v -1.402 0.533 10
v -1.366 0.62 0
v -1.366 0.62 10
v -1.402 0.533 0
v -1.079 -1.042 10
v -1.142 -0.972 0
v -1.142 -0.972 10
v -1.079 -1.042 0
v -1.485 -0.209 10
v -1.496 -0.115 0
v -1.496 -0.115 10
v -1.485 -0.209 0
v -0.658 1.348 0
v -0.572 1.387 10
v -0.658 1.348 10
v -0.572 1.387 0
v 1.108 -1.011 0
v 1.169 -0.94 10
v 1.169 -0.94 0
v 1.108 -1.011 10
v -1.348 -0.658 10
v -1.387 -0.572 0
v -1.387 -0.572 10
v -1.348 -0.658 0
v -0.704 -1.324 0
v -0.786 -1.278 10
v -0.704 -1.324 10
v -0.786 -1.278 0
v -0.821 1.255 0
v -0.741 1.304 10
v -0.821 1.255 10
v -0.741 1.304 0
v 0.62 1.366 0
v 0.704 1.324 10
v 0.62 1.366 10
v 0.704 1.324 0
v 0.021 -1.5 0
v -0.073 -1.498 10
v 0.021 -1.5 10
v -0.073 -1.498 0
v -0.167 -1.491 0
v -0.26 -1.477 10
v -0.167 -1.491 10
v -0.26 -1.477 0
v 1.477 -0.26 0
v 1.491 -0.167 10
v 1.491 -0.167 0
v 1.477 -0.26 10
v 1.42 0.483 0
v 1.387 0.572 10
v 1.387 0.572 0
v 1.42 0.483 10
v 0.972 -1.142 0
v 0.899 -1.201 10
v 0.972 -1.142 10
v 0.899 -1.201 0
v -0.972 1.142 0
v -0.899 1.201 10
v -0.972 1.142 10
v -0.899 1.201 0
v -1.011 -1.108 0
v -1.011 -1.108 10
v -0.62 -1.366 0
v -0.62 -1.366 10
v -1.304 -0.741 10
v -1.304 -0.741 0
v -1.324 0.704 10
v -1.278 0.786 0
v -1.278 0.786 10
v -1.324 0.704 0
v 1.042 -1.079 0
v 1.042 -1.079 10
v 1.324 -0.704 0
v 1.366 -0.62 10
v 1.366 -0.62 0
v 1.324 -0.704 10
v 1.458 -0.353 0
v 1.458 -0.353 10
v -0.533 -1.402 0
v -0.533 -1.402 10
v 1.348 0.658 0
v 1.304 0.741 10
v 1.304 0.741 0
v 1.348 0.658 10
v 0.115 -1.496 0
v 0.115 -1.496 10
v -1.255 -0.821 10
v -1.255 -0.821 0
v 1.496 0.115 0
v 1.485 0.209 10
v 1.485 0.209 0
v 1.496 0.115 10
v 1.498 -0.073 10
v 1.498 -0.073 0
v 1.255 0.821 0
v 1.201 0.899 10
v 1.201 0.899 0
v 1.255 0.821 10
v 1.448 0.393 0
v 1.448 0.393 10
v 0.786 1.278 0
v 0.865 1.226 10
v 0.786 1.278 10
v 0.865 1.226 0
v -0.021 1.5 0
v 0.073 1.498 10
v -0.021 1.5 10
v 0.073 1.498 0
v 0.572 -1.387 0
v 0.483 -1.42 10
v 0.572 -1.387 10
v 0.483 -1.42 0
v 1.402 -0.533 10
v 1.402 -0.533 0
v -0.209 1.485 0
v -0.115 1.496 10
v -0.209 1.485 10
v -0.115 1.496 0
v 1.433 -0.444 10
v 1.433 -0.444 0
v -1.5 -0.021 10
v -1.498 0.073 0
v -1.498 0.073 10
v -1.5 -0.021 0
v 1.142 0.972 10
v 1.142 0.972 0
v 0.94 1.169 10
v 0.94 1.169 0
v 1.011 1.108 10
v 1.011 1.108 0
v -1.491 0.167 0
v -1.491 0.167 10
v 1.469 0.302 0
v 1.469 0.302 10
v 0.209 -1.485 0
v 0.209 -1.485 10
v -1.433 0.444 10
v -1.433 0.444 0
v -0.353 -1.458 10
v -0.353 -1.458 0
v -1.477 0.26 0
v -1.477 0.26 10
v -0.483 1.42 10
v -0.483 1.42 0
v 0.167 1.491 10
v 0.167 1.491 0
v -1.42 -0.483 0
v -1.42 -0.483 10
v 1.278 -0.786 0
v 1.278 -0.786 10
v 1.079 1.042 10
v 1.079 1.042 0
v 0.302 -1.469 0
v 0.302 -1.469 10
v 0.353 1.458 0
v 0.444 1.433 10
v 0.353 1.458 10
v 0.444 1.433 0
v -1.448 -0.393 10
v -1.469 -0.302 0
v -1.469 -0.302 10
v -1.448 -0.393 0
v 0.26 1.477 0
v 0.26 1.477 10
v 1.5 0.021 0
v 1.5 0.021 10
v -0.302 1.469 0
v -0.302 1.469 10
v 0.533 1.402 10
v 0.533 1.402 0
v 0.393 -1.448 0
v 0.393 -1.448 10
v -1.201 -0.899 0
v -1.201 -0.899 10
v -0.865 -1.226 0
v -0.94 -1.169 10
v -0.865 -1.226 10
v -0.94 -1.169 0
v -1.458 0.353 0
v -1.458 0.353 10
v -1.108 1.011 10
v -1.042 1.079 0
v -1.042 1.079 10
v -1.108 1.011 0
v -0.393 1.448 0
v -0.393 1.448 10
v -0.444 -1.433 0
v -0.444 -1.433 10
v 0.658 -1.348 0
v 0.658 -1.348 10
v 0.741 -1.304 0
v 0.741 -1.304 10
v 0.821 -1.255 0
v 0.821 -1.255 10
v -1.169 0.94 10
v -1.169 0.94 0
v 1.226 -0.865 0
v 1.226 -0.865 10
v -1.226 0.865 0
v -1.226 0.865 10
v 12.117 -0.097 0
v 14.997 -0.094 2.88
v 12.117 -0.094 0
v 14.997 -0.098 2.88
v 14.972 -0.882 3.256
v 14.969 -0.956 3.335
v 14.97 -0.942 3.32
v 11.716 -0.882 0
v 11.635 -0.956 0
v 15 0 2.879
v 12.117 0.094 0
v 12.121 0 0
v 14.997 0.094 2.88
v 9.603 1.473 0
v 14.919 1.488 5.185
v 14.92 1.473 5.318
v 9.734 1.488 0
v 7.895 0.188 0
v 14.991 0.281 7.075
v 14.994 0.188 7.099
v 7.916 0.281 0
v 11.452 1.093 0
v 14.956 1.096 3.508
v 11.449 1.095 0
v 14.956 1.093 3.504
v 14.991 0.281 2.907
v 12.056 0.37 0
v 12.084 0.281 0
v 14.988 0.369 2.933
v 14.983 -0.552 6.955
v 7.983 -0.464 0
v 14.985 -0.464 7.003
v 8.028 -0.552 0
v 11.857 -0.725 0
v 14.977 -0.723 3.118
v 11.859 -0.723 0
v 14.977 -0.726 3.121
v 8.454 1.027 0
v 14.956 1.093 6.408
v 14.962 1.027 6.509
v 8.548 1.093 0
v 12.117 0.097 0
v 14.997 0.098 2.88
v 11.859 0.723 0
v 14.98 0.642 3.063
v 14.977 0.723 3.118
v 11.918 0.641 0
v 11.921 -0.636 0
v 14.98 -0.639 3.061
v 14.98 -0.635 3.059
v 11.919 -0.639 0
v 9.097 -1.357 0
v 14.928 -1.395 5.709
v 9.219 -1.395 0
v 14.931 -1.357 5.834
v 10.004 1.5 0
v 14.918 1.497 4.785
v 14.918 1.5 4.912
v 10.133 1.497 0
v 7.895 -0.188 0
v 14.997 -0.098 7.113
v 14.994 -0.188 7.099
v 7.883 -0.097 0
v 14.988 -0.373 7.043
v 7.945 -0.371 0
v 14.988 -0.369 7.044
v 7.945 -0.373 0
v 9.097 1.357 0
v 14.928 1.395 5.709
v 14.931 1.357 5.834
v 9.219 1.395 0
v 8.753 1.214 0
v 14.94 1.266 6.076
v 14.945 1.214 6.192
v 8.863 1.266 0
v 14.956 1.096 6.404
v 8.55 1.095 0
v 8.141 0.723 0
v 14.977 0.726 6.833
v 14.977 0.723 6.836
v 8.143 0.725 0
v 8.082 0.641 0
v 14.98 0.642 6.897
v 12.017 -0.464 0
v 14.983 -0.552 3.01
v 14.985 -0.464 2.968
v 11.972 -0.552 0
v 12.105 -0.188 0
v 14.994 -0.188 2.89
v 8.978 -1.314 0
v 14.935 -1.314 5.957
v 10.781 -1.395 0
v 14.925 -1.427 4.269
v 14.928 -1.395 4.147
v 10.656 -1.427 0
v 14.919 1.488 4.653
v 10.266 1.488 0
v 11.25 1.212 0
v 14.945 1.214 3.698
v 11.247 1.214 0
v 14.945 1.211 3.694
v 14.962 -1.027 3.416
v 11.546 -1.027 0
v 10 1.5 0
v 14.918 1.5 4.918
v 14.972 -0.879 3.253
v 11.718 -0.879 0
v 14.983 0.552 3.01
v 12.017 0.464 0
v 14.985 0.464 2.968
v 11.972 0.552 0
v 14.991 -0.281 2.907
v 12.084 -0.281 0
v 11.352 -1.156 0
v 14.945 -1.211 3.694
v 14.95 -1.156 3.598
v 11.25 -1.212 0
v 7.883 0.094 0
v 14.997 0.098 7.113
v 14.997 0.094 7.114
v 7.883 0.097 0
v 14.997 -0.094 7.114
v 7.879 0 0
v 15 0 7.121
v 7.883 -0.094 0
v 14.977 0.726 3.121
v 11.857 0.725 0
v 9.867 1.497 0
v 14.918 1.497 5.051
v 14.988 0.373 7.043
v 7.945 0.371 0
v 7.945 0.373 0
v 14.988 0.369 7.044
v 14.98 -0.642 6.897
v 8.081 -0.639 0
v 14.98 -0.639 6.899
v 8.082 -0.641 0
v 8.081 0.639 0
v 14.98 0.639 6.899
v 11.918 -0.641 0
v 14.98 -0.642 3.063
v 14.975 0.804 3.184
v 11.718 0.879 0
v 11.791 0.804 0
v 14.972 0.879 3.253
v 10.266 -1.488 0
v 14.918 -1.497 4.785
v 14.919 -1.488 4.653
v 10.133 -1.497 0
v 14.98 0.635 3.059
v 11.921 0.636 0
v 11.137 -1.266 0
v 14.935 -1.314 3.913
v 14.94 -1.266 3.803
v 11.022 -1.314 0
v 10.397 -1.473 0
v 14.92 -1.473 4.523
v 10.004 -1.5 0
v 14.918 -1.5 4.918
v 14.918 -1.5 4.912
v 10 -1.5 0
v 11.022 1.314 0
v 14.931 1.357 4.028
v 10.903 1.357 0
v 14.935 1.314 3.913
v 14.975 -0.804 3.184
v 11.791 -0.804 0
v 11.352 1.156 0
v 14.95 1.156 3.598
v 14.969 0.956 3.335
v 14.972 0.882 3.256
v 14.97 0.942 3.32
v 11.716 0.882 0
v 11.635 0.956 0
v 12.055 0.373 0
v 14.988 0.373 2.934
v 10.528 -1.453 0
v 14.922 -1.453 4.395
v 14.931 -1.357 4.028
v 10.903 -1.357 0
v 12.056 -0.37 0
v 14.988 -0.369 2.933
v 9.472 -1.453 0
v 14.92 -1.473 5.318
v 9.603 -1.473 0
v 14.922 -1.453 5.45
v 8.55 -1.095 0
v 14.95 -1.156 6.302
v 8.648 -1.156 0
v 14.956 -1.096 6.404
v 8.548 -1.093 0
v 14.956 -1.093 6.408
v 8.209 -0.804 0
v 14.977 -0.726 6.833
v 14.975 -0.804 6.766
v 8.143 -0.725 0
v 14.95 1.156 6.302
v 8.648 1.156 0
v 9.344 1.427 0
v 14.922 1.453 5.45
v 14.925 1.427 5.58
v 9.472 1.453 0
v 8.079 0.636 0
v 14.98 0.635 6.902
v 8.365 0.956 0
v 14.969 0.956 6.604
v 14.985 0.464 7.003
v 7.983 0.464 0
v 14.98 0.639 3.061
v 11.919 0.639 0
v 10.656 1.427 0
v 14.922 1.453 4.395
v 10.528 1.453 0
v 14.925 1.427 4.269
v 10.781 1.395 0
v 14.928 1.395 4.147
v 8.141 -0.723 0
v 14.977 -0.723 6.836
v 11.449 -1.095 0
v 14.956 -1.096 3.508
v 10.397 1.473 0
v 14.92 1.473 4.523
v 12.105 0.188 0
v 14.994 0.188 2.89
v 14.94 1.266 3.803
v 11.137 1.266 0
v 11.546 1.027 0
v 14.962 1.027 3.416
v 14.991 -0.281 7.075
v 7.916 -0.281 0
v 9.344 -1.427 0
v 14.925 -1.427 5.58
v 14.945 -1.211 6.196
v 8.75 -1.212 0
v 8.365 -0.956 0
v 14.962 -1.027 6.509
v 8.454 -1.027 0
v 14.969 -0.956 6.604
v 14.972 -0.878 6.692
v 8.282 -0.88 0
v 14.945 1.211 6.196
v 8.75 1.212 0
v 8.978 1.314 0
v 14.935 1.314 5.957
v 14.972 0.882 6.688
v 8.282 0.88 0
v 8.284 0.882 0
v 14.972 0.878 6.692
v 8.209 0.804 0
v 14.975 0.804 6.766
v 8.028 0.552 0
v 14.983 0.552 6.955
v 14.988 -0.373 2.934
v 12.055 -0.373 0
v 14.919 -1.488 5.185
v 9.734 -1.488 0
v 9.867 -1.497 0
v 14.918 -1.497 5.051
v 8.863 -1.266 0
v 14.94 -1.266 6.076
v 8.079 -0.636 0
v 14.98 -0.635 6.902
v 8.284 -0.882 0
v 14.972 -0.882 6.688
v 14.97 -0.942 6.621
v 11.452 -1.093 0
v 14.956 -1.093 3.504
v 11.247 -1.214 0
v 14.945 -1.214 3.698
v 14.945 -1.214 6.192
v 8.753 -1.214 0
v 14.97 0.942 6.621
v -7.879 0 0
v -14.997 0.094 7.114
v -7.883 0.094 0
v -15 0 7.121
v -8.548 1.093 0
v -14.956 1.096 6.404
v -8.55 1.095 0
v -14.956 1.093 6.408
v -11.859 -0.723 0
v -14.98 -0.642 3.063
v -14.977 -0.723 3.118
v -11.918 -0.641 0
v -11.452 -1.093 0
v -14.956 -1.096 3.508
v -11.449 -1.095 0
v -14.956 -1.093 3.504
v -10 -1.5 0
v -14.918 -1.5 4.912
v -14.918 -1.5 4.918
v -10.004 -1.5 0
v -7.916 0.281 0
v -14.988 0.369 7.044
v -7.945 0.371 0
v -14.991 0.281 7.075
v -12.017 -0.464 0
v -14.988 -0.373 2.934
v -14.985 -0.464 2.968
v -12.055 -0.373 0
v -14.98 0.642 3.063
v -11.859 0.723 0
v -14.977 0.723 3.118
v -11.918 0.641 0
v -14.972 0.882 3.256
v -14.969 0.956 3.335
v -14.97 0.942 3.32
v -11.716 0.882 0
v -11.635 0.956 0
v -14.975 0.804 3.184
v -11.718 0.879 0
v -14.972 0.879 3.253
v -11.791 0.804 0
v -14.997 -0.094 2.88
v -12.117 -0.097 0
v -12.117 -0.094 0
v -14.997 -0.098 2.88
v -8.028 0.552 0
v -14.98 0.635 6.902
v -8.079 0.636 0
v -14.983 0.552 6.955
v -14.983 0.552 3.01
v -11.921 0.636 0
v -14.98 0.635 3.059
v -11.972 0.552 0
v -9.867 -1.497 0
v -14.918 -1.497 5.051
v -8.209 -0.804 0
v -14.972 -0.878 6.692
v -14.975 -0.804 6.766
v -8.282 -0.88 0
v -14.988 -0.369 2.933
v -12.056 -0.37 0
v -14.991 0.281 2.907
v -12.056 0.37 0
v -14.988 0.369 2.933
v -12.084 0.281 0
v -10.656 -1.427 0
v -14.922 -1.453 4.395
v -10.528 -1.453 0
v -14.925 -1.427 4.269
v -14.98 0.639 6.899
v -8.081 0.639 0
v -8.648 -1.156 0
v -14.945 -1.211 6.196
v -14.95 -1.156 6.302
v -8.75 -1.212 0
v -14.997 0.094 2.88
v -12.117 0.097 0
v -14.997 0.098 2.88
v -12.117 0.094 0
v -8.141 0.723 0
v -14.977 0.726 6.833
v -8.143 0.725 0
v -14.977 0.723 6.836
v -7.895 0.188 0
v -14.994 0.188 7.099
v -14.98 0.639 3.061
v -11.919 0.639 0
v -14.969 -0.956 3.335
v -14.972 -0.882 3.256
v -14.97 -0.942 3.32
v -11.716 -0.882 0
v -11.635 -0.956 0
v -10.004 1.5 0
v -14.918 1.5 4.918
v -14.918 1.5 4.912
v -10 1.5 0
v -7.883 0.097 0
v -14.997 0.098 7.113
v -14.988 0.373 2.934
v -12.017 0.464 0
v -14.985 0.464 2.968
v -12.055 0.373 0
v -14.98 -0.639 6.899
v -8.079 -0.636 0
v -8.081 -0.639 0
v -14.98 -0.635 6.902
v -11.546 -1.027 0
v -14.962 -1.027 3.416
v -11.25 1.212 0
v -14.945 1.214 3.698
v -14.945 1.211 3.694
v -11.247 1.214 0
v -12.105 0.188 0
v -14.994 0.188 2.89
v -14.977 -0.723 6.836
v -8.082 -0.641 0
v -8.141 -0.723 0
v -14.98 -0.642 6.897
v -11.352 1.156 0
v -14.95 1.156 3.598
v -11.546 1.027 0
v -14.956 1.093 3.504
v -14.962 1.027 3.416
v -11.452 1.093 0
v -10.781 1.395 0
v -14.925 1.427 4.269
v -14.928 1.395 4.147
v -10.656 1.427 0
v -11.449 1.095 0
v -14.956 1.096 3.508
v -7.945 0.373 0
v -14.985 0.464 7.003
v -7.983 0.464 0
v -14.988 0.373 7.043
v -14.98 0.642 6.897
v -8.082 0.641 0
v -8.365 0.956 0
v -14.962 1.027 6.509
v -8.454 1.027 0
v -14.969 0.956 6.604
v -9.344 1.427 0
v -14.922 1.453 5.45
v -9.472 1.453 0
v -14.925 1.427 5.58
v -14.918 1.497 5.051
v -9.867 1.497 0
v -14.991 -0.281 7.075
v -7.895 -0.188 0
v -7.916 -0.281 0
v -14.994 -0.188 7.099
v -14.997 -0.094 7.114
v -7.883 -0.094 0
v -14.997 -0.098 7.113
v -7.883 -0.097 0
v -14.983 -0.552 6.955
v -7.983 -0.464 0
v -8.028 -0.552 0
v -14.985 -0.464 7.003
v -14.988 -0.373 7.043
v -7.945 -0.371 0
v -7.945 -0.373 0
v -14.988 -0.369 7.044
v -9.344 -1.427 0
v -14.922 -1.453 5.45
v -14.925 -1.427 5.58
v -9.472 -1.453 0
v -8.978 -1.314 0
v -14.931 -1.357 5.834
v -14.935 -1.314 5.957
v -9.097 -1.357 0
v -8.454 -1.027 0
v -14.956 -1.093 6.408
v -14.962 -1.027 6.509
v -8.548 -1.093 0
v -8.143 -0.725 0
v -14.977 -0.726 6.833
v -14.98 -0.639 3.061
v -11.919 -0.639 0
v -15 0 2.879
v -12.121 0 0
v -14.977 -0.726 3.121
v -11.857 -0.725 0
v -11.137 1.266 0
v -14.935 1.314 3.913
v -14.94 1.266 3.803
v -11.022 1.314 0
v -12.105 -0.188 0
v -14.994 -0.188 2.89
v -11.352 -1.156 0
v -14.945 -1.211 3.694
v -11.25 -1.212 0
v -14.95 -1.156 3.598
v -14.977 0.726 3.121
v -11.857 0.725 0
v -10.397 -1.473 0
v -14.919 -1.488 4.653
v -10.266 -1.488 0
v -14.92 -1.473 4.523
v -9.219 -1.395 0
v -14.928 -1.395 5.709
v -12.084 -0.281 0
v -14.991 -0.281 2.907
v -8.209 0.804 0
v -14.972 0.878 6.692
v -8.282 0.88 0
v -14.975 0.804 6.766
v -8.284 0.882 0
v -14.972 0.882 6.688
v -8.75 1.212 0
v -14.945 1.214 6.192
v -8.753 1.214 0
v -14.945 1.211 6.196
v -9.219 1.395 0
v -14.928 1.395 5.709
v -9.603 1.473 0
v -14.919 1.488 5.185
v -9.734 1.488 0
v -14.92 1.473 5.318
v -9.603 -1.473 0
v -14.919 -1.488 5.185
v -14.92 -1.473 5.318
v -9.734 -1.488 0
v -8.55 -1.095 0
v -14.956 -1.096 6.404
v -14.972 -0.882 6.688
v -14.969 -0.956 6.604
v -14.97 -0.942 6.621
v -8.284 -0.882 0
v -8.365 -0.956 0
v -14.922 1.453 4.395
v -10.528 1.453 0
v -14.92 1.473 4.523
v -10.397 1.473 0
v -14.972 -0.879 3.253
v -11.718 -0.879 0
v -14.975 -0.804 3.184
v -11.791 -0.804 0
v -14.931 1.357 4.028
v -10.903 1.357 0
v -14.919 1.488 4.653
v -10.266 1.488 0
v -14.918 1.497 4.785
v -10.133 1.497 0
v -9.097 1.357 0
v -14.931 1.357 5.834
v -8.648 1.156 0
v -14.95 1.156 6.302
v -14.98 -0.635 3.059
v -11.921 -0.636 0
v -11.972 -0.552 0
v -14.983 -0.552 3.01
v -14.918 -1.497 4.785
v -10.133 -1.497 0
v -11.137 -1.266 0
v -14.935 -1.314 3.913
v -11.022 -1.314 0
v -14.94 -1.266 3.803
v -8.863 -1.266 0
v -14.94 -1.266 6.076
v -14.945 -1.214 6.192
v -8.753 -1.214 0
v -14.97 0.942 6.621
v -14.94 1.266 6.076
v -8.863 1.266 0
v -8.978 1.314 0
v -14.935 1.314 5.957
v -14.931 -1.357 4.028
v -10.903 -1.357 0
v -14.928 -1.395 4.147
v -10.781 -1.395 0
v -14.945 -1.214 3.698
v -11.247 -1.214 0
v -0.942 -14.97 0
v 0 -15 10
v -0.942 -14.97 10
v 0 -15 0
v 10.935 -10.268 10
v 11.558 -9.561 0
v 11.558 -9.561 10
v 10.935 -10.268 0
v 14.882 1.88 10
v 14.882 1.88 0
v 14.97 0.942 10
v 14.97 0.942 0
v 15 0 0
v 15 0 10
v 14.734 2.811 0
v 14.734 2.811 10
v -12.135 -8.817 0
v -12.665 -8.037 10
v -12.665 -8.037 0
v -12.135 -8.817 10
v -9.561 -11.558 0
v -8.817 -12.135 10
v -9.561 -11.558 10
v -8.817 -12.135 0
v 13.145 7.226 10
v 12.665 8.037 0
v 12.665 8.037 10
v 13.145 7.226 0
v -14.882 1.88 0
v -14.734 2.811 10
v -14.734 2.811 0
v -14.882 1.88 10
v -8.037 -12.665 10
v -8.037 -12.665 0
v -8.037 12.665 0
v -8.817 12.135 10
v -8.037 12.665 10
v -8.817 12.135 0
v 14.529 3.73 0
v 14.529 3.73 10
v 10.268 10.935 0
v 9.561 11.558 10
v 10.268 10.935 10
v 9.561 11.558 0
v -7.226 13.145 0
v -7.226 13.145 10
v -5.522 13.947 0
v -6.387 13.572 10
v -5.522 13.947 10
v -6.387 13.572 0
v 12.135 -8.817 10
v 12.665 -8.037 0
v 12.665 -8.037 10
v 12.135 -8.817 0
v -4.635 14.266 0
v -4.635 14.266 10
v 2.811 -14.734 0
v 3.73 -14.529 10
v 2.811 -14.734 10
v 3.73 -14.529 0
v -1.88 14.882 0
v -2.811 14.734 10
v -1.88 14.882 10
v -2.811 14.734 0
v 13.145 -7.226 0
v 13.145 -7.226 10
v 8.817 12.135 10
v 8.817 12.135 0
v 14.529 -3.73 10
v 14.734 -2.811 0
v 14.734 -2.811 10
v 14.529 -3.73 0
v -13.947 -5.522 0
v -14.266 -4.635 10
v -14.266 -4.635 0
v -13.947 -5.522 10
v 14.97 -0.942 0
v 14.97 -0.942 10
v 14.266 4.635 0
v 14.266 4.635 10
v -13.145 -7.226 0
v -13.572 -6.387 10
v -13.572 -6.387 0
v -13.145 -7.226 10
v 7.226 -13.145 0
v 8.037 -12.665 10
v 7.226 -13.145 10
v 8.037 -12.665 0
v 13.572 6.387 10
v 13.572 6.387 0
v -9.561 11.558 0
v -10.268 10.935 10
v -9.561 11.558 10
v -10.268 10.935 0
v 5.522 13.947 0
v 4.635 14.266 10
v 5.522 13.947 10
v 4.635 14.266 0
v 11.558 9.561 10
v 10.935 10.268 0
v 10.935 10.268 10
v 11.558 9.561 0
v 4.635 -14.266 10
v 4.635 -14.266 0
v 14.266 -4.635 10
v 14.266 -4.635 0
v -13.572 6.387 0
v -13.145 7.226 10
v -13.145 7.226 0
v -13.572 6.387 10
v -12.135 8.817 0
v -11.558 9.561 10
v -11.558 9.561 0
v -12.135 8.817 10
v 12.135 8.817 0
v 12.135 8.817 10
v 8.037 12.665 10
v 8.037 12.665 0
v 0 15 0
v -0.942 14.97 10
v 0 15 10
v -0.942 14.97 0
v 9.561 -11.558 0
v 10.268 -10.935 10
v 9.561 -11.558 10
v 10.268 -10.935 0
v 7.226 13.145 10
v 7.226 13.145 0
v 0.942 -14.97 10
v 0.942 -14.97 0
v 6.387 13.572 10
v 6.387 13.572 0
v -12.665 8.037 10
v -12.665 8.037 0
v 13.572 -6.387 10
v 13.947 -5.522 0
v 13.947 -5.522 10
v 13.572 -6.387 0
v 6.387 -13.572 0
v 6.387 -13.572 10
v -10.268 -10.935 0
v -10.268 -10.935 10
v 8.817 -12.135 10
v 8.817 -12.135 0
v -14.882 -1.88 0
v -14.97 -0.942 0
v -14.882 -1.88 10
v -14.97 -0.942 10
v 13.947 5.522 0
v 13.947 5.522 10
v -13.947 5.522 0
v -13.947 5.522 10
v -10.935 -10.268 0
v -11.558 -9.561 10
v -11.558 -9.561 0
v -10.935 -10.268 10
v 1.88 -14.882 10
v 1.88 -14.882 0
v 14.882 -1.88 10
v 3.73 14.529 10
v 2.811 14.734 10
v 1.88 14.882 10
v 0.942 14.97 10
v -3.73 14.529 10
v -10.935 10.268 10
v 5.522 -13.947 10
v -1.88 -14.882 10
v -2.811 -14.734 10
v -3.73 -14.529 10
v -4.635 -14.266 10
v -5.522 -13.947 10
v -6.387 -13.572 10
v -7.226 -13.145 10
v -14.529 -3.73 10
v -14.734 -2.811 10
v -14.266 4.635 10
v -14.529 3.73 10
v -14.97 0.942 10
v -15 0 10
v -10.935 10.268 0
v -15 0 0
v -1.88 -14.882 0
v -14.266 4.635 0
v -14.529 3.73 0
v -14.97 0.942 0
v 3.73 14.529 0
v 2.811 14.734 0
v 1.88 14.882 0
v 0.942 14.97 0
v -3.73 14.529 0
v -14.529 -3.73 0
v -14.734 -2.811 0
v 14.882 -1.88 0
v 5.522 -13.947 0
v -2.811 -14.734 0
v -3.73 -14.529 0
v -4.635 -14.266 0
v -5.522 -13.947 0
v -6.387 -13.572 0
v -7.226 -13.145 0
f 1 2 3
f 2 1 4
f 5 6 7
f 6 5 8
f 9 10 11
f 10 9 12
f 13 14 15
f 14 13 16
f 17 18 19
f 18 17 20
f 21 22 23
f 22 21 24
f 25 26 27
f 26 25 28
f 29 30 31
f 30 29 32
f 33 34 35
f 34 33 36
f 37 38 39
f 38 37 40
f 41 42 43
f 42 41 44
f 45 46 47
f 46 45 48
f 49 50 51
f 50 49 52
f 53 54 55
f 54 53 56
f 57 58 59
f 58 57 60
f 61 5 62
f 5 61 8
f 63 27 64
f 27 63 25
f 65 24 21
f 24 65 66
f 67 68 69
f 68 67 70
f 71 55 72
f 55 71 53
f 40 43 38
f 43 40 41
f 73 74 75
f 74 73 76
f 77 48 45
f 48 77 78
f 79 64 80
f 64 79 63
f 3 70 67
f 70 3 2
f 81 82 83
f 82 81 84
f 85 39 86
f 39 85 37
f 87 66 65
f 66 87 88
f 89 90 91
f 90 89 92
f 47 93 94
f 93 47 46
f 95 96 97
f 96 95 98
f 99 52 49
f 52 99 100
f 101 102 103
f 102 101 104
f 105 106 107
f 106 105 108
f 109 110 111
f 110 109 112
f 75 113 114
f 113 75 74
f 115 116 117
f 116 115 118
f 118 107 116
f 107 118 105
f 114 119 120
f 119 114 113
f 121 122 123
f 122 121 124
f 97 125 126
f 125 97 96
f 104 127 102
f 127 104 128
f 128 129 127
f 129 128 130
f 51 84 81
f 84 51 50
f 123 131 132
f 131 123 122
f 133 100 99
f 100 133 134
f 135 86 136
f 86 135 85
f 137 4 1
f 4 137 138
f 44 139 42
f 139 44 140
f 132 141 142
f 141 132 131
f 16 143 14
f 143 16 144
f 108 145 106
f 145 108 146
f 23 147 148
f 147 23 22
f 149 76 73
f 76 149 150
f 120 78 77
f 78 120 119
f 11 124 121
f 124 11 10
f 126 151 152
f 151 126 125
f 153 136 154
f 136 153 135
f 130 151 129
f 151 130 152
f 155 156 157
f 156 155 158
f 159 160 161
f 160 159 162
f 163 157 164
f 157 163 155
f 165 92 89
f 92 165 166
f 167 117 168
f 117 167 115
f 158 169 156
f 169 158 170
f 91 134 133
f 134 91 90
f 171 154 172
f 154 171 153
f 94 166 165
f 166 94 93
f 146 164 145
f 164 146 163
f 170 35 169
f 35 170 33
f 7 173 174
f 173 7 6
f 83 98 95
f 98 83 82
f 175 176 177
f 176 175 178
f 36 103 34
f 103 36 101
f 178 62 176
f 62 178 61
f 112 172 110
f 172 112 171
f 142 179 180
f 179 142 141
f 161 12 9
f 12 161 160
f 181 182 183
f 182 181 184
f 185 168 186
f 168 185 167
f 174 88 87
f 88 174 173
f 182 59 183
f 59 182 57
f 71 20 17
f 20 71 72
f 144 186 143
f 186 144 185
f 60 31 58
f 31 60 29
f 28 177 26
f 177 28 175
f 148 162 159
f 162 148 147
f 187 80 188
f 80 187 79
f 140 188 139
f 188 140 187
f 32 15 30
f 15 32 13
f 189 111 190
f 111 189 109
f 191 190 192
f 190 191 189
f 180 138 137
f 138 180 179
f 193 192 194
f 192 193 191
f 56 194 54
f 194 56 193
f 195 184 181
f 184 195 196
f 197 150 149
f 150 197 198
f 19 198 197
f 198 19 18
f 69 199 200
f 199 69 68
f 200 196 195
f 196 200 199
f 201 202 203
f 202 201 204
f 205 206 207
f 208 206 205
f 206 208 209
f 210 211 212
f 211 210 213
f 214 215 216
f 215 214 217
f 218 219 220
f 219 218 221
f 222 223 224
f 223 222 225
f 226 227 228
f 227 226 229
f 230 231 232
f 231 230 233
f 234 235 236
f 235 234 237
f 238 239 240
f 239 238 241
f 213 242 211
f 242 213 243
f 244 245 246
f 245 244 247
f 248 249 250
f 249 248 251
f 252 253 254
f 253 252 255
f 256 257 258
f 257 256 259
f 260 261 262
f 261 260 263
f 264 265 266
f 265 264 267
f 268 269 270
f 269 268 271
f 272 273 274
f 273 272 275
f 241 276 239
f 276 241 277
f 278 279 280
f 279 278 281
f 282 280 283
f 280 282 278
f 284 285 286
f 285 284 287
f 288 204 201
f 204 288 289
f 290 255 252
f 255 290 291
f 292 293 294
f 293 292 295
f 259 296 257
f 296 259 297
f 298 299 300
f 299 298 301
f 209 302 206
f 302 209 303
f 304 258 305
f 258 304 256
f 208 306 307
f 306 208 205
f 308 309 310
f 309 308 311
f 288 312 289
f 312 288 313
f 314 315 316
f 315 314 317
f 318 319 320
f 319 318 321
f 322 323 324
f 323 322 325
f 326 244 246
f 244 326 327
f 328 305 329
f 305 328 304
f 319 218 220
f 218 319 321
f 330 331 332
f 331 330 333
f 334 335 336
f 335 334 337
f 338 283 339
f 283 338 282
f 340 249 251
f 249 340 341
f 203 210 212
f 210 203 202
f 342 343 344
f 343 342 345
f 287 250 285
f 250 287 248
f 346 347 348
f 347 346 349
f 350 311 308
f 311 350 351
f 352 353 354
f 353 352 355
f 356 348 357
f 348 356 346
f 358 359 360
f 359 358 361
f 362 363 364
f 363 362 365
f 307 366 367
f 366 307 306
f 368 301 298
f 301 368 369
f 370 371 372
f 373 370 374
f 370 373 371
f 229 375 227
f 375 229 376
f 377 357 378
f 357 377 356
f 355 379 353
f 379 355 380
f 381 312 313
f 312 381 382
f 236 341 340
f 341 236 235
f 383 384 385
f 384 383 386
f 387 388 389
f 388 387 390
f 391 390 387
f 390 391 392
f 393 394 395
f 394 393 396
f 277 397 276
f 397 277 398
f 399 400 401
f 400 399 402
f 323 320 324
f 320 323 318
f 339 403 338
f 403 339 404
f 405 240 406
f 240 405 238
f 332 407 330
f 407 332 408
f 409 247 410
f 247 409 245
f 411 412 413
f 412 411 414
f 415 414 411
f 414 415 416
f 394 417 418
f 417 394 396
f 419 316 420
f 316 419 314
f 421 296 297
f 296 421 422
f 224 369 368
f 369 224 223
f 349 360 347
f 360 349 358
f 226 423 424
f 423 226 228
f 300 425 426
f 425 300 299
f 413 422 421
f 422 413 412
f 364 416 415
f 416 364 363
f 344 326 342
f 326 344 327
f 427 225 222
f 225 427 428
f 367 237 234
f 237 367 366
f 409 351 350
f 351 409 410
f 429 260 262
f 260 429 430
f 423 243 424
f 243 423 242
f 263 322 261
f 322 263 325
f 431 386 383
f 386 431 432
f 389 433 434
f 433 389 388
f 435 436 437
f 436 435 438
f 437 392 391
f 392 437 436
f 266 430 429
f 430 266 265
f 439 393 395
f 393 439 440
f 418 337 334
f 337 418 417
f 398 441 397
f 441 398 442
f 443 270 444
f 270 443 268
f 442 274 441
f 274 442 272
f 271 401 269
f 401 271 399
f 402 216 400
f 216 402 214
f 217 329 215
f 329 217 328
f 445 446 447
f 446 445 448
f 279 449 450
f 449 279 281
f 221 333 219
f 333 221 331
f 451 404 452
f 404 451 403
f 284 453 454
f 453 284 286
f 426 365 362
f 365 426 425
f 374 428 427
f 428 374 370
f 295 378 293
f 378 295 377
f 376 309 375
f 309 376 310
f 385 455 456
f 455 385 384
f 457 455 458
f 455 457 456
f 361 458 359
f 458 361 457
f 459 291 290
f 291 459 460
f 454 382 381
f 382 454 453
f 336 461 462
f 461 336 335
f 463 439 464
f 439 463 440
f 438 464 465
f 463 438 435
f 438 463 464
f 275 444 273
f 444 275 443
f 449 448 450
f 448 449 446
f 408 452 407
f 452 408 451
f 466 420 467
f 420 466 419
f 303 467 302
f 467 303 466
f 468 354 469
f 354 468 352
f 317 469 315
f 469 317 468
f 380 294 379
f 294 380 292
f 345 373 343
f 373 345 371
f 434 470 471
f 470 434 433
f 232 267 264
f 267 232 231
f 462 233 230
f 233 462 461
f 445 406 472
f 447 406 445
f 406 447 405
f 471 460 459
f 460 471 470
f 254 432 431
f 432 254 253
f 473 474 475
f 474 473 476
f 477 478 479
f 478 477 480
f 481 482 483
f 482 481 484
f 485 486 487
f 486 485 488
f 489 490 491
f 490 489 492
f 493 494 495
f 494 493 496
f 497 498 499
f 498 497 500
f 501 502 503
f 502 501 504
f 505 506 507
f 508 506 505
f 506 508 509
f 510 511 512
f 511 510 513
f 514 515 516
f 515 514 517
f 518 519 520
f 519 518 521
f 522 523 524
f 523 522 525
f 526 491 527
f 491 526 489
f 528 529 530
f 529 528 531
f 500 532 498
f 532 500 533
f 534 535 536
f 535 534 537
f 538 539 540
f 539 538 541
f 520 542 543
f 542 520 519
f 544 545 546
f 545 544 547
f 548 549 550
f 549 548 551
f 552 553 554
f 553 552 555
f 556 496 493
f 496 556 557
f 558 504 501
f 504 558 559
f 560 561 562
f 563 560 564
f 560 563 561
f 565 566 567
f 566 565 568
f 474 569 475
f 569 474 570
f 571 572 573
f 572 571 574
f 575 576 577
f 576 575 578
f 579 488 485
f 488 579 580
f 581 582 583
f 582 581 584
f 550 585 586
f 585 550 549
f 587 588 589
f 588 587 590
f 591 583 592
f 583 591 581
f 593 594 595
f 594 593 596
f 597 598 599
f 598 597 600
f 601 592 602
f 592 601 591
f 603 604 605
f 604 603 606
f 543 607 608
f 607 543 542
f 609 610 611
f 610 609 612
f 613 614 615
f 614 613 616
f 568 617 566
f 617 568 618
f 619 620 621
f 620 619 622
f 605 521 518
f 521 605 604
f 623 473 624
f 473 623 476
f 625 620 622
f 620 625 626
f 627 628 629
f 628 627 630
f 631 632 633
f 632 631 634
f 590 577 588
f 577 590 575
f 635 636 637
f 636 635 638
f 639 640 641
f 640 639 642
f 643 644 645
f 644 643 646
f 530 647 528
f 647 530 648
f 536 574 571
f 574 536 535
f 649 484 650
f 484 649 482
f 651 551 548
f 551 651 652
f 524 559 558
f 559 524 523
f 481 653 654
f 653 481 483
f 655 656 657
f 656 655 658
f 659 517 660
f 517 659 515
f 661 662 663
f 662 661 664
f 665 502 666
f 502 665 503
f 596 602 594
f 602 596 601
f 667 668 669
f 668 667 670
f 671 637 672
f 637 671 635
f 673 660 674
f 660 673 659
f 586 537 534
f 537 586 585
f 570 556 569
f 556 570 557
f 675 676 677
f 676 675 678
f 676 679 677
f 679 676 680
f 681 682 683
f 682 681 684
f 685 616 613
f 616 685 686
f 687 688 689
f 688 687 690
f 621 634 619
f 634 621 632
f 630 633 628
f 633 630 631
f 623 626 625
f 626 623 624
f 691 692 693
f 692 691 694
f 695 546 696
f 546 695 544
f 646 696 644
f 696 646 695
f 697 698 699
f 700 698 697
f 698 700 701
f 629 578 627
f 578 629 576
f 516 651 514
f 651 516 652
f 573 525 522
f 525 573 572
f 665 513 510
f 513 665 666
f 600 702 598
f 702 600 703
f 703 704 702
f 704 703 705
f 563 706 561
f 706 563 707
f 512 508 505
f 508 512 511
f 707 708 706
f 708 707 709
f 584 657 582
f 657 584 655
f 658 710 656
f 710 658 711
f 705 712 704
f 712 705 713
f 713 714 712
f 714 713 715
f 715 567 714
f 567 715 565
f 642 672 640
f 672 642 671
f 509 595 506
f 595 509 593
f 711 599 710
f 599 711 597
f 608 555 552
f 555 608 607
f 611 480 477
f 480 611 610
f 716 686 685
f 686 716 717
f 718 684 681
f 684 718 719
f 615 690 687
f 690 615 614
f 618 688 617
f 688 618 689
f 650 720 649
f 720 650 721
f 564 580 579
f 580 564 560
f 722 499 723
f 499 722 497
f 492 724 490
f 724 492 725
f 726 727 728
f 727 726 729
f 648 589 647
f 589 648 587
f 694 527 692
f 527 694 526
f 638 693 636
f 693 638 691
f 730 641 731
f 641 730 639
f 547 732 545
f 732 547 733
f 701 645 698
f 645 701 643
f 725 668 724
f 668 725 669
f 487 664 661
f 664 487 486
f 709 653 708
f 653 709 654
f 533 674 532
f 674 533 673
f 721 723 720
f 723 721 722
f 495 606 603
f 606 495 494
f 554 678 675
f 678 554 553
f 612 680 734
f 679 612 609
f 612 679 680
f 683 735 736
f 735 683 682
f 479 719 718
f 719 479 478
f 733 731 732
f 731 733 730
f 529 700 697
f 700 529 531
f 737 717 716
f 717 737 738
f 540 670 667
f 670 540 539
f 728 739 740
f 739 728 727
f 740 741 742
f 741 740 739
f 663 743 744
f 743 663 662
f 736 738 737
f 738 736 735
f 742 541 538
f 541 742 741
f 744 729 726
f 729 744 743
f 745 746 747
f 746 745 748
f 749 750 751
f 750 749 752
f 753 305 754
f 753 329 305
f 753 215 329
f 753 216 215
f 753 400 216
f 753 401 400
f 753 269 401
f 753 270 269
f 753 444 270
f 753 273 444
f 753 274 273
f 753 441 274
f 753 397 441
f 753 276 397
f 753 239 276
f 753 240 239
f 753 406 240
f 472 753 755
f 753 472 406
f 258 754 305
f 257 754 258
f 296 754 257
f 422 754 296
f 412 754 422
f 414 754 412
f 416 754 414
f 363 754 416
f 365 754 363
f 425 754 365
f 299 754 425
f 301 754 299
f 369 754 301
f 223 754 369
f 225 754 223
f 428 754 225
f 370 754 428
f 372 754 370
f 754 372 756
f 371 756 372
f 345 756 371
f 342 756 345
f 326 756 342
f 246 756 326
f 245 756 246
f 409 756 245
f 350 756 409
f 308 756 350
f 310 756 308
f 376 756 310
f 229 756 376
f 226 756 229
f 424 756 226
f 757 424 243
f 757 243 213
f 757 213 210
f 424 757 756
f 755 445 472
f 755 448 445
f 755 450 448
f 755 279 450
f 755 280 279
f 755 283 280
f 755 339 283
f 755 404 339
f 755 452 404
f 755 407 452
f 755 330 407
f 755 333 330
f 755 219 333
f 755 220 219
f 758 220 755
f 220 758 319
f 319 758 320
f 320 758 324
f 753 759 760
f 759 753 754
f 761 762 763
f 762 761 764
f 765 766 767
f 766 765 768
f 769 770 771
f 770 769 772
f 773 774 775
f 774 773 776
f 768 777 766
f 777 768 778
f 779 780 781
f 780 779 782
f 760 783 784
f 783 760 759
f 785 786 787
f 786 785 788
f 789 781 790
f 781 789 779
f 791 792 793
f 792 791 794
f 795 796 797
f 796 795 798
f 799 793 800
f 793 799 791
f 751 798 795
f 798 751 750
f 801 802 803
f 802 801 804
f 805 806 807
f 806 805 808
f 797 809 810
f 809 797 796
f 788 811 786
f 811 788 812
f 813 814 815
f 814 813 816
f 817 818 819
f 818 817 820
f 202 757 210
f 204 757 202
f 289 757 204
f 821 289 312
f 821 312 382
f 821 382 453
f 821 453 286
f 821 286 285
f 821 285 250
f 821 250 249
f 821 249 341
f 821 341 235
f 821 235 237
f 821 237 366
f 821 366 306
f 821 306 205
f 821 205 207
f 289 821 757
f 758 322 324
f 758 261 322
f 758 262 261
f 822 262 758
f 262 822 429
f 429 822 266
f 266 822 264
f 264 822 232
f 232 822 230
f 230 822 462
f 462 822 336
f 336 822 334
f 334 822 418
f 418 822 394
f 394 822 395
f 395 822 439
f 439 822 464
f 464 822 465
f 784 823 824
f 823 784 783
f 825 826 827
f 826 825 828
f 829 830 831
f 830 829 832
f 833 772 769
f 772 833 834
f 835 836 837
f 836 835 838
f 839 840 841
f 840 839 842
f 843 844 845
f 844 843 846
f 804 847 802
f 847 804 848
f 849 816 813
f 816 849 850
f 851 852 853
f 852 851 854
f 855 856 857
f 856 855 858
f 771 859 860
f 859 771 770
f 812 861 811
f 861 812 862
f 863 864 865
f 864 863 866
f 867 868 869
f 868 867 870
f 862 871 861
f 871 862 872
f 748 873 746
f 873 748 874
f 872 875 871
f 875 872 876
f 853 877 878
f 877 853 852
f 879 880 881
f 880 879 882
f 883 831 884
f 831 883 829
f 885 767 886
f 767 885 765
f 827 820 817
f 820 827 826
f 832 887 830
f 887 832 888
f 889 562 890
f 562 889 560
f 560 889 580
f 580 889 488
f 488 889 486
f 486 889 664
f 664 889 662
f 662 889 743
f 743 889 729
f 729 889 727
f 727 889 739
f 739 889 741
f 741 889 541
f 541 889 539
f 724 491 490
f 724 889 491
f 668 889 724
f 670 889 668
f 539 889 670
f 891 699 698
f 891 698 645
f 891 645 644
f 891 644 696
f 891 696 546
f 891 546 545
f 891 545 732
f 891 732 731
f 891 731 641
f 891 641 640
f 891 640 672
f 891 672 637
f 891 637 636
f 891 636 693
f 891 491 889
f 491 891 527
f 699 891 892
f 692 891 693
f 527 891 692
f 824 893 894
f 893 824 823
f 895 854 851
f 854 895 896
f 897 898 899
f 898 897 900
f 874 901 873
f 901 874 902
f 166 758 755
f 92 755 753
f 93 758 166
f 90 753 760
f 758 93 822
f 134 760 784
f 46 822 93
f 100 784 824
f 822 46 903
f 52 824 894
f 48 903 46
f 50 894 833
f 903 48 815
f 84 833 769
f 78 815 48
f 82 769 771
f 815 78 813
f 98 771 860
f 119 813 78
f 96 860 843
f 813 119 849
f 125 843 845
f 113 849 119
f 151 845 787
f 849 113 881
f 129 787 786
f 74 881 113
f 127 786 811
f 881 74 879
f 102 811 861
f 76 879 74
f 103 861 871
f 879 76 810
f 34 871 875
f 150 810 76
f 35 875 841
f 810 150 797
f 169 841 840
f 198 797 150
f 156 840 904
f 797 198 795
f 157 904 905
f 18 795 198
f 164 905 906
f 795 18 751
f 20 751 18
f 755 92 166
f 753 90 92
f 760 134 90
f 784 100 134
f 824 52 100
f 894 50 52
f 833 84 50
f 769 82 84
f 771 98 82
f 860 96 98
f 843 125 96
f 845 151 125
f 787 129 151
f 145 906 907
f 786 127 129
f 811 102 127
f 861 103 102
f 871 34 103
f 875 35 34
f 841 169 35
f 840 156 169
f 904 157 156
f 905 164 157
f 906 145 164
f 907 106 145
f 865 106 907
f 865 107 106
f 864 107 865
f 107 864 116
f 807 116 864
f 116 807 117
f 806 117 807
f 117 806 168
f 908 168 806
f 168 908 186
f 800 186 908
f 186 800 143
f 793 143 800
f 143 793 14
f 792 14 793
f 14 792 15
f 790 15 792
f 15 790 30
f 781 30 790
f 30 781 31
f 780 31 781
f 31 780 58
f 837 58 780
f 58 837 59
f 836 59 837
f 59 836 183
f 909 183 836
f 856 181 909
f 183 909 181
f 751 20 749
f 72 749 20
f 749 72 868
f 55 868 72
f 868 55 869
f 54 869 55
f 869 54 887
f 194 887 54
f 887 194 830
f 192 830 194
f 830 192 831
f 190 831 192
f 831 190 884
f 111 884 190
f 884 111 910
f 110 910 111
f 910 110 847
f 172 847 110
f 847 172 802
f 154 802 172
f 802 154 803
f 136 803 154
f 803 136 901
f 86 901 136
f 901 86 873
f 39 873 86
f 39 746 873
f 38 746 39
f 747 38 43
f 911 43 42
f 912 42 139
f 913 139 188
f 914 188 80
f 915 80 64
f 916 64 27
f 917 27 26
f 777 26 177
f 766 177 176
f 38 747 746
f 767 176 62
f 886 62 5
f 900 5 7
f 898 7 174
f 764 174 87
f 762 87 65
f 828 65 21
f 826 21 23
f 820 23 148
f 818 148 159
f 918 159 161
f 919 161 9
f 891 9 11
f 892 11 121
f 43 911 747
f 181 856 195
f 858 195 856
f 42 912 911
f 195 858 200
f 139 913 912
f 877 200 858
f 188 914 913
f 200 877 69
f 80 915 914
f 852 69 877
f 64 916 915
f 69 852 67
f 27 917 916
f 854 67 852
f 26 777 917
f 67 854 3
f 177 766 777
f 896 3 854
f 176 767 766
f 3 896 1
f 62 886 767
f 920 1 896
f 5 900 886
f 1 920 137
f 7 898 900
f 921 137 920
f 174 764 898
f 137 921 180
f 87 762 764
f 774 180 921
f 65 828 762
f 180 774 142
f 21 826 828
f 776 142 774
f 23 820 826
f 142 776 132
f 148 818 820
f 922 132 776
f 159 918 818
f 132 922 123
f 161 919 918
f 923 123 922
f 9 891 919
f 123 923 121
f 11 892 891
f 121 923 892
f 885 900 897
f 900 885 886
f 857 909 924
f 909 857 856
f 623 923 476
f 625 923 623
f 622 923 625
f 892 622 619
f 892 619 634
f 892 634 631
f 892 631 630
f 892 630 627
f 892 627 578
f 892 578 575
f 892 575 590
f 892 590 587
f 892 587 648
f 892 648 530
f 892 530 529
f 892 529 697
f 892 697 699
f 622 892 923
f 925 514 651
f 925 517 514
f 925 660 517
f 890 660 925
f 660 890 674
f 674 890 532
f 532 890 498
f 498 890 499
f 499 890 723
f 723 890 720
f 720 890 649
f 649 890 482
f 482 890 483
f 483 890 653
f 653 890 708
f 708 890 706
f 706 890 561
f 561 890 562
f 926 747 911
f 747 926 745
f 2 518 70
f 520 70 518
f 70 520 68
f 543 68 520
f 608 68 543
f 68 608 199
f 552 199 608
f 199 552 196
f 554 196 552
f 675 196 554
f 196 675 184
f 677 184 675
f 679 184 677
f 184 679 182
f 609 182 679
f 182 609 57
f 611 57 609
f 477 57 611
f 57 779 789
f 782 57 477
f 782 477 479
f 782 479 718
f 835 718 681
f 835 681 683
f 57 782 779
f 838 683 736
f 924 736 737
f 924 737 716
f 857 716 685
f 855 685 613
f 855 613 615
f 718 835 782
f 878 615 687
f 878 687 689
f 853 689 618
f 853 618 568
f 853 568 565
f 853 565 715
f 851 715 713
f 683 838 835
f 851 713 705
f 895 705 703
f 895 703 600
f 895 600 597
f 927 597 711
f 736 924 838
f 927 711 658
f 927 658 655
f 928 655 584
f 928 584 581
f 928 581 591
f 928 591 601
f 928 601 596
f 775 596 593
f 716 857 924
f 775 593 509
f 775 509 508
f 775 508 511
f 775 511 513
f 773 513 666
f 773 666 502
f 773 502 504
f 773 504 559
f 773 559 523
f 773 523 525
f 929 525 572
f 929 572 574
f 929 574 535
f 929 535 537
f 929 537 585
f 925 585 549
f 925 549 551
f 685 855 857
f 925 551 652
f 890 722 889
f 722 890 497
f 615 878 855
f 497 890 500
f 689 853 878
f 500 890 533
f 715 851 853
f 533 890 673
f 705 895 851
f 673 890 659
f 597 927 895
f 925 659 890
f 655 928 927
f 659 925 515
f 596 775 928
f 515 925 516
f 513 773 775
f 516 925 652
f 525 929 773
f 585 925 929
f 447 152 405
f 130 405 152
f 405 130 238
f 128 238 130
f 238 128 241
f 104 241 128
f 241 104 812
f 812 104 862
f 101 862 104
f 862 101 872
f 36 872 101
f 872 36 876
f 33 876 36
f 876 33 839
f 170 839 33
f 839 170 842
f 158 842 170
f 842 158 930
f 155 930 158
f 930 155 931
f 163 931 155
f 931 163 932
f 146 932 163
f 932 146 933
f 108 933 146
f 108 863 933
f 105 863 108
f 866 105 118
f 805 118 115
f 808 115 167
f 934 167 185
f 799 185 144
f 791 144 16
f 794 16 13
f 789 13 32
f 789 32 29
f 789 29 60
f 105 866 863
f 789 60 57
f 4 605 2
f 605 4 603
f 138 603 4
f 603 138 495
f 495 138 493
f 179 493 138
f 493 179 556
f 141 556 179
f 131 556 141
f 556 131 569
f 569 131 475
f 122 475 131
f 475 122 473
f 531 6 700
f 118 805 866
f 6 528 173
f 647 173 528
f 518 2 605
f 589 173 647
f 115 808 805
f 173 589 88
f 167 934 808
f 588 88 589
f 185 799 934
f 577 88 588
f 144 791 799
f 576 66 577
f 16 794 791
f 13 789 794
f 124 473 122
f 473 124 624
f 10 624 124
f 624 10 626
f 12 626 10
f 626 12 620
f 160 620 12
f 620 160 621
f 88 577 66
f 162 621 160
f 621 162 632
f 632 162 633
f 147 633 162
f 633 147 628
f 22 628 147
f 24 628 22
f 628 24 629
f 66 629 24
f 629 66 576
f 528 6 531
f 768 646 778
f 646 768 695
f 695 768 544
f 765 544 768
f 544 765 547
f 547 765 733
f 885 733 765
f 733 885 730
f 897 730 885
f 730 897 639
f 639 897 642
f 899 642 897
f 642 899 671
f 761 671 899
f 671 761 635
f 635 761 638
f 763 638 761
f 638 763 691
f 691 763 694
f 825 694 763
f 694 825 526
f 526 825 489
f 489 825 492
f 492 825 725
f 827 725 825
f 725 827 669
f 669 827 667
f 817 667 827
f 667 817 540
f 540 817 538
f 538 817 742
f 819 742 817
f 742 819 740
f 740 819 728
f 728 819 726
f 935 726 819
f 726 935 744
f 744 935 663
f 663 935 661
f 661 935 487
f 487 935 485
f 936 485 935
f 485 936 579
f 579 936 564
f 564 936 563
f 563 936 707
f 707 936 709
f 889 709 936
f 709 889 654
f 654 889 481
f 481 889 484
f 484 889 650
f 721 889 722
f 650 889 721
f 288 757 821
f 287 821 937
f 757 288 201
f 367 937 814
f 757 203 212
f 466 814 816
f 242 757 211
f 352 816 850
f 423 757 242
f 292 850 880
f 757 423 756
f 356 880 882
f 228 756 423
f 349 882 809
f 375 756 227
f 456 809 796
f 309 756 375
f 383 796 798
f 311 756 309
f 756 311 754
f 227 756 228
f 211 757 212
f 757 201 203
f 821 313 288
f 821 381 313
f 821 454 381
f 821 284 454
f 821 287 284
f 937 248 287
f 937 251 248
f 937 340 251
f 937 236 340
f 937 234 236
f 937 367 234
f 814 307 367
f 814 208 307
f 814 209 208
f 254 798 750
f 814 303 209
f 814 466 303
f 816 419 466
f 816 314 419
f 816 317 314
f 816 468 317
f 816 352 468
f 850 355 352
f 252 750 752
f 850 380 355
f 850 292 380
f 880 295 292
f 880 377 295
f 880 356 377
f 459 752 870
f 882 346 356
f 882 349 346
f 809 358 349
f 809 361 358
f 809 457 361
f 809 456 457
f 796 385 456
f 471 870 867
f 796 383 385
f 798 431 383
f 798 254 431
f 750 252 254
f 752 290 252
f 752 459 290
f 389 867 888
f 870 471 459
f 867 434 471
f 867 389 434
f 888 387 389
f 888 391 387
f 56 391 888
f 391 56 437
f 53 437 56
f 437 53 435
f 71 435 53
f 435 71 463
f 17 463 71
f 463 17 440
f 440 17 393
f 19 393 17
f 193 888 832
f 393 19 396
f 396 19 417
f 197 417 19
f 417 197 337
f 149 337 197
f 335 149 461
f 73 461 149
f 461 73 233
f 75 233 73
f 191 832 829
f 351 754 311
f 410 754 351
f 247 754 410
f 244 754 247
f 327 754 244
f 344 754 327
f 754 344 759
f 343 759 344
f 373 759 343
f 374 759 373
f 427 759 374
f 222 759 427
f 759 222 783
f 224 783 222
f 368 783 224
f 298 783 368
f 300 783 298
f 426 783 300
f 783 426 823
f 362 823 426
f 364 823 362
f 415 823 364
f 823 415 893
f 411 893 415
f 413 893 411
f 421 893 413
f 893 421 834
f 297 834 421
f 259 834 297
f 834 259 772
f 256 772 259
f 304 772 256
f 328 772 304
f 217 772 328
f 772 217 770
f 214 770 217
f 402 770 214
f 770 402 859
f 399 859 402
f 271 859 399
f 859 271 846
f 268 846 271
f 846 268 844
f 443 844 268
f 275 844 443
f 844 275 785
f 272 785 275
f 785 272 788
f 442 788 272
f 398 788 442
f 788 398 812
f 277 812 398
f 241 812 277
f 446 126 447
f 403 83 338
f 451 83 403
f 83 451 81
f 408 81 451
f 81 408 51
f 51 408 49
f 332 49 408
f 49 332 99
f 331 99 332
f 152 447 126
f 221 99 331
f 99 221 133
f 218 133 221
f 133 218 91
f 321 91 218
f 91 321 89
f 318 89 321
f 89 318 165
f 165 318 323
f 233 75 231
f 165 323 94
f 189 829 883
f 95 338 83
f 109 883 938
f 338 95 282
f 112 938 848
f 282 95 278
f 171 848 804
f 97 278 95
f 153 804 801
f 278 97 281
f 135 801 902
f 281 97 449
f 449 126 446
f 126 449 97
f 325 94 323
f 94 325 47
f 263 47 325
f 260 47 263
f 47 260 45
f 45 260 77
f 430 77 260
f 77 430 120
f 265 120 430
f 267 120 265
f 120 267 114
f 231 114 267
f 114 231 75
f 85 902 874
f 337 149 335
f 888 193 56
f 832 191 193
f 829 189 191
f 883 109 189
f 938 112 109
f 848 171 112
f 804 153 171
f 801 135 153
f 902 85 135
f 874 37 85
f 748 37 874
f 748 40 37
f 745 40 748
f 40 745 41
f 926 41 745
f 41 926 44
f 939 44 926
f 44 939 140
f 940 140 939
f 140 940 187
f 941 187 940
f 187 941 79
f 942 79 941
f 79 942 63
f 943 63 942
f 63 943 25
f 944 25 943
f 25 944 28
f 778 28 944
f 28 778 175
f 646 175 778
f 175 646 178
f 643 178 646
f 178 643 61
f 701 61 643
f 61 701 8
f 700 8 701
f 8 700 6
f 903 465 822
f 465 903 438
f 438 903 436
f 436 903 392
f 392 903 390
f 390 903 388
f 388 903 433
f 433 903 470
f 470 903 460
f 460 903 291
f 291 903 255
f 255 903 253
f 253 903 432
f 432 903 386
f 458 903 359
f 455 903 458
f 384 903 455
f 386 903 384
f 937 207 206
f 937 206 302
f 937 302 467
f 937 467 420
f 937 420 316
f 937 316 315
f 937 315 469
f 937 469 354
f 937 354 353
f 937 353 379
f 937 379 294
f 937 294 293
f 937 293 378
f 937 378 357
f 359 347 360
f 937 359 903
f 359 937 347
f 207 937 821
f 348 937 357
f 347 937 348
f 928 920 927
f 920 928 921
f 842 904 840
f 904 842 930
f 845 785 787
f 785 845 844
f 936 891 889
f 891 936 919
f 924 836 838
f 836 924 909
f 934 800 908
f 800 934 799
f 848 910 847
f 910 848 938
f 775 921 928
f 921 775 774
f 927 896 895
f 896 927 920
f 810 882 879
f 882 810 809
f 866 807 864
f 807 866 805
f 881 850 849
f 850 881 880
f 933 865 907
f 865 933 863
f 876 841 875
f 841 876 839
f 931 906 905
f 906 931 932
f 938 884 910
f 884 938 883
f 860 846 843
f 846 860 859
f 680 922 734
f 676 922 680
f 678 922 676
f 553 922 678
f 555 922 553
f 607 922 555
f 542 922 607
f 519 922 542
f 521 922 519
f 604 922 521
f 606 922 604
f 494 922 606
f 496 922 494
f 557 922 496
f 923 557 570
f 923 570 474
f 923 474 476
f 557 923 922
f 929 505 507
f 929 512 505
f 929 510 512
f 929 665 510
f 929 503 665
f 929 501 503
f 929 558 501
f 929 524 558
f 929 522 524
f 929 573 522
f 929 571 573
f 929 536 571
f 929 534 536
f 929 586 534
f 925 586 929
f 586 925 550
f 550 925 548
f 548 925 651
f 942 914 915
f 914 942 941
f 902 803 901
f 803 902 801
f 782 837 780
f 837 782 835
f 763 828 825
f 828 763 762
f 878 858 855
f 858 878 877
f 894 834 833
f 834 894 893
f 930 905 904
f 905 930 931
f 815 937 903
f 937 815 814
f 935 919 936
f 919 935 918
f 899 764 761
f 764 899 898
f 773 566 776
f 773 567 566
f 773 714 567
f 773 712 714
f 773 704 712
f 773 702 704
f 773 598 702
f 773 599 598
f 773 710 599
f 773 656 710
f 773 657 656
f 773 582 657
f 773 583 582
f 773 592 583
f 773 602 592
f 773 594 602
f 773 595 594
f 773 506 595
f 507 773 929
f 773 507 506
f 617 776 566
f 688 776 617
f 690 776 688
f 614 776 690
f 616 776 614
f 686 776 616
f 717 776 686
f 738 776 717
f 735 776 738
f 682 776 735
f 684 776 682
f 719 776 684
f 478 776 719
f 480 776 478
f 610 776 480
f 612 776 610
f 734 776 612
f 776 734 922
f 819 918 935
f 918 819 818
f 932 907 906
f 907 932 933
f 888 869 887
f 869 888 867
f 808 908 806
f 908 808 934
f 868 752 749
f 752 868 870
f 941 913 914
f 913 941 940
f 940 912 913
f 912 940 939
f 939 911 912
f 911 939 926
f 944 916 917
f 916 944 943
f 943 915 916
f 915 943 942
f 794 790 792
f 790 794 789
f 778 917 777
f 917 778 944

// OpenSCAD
difference(){
	union(){        

        translate([0,0,0]){
                cylinder(h=10, r=15, $fn=100, center=false);
        }
	}
	union() {

        translate([0,0,-10]){
            rotate(a = [0,0,-10]) {
                cylinder(h=500, r=1.5, $fn=100, center=false);
            }
        }	
        translate([0,0,-10]){
            rotate(a = [0,45,0]) {
                cylinder(h=500, r=1.5, $fn=100, center=false);
            }
        }	
        translate([0,0,-10]){
            rotate(a = [0,-45,0]) {
                cylinder(h=500, r=1.5, $fn=100, center=false);
            }
        }	




	}
}
